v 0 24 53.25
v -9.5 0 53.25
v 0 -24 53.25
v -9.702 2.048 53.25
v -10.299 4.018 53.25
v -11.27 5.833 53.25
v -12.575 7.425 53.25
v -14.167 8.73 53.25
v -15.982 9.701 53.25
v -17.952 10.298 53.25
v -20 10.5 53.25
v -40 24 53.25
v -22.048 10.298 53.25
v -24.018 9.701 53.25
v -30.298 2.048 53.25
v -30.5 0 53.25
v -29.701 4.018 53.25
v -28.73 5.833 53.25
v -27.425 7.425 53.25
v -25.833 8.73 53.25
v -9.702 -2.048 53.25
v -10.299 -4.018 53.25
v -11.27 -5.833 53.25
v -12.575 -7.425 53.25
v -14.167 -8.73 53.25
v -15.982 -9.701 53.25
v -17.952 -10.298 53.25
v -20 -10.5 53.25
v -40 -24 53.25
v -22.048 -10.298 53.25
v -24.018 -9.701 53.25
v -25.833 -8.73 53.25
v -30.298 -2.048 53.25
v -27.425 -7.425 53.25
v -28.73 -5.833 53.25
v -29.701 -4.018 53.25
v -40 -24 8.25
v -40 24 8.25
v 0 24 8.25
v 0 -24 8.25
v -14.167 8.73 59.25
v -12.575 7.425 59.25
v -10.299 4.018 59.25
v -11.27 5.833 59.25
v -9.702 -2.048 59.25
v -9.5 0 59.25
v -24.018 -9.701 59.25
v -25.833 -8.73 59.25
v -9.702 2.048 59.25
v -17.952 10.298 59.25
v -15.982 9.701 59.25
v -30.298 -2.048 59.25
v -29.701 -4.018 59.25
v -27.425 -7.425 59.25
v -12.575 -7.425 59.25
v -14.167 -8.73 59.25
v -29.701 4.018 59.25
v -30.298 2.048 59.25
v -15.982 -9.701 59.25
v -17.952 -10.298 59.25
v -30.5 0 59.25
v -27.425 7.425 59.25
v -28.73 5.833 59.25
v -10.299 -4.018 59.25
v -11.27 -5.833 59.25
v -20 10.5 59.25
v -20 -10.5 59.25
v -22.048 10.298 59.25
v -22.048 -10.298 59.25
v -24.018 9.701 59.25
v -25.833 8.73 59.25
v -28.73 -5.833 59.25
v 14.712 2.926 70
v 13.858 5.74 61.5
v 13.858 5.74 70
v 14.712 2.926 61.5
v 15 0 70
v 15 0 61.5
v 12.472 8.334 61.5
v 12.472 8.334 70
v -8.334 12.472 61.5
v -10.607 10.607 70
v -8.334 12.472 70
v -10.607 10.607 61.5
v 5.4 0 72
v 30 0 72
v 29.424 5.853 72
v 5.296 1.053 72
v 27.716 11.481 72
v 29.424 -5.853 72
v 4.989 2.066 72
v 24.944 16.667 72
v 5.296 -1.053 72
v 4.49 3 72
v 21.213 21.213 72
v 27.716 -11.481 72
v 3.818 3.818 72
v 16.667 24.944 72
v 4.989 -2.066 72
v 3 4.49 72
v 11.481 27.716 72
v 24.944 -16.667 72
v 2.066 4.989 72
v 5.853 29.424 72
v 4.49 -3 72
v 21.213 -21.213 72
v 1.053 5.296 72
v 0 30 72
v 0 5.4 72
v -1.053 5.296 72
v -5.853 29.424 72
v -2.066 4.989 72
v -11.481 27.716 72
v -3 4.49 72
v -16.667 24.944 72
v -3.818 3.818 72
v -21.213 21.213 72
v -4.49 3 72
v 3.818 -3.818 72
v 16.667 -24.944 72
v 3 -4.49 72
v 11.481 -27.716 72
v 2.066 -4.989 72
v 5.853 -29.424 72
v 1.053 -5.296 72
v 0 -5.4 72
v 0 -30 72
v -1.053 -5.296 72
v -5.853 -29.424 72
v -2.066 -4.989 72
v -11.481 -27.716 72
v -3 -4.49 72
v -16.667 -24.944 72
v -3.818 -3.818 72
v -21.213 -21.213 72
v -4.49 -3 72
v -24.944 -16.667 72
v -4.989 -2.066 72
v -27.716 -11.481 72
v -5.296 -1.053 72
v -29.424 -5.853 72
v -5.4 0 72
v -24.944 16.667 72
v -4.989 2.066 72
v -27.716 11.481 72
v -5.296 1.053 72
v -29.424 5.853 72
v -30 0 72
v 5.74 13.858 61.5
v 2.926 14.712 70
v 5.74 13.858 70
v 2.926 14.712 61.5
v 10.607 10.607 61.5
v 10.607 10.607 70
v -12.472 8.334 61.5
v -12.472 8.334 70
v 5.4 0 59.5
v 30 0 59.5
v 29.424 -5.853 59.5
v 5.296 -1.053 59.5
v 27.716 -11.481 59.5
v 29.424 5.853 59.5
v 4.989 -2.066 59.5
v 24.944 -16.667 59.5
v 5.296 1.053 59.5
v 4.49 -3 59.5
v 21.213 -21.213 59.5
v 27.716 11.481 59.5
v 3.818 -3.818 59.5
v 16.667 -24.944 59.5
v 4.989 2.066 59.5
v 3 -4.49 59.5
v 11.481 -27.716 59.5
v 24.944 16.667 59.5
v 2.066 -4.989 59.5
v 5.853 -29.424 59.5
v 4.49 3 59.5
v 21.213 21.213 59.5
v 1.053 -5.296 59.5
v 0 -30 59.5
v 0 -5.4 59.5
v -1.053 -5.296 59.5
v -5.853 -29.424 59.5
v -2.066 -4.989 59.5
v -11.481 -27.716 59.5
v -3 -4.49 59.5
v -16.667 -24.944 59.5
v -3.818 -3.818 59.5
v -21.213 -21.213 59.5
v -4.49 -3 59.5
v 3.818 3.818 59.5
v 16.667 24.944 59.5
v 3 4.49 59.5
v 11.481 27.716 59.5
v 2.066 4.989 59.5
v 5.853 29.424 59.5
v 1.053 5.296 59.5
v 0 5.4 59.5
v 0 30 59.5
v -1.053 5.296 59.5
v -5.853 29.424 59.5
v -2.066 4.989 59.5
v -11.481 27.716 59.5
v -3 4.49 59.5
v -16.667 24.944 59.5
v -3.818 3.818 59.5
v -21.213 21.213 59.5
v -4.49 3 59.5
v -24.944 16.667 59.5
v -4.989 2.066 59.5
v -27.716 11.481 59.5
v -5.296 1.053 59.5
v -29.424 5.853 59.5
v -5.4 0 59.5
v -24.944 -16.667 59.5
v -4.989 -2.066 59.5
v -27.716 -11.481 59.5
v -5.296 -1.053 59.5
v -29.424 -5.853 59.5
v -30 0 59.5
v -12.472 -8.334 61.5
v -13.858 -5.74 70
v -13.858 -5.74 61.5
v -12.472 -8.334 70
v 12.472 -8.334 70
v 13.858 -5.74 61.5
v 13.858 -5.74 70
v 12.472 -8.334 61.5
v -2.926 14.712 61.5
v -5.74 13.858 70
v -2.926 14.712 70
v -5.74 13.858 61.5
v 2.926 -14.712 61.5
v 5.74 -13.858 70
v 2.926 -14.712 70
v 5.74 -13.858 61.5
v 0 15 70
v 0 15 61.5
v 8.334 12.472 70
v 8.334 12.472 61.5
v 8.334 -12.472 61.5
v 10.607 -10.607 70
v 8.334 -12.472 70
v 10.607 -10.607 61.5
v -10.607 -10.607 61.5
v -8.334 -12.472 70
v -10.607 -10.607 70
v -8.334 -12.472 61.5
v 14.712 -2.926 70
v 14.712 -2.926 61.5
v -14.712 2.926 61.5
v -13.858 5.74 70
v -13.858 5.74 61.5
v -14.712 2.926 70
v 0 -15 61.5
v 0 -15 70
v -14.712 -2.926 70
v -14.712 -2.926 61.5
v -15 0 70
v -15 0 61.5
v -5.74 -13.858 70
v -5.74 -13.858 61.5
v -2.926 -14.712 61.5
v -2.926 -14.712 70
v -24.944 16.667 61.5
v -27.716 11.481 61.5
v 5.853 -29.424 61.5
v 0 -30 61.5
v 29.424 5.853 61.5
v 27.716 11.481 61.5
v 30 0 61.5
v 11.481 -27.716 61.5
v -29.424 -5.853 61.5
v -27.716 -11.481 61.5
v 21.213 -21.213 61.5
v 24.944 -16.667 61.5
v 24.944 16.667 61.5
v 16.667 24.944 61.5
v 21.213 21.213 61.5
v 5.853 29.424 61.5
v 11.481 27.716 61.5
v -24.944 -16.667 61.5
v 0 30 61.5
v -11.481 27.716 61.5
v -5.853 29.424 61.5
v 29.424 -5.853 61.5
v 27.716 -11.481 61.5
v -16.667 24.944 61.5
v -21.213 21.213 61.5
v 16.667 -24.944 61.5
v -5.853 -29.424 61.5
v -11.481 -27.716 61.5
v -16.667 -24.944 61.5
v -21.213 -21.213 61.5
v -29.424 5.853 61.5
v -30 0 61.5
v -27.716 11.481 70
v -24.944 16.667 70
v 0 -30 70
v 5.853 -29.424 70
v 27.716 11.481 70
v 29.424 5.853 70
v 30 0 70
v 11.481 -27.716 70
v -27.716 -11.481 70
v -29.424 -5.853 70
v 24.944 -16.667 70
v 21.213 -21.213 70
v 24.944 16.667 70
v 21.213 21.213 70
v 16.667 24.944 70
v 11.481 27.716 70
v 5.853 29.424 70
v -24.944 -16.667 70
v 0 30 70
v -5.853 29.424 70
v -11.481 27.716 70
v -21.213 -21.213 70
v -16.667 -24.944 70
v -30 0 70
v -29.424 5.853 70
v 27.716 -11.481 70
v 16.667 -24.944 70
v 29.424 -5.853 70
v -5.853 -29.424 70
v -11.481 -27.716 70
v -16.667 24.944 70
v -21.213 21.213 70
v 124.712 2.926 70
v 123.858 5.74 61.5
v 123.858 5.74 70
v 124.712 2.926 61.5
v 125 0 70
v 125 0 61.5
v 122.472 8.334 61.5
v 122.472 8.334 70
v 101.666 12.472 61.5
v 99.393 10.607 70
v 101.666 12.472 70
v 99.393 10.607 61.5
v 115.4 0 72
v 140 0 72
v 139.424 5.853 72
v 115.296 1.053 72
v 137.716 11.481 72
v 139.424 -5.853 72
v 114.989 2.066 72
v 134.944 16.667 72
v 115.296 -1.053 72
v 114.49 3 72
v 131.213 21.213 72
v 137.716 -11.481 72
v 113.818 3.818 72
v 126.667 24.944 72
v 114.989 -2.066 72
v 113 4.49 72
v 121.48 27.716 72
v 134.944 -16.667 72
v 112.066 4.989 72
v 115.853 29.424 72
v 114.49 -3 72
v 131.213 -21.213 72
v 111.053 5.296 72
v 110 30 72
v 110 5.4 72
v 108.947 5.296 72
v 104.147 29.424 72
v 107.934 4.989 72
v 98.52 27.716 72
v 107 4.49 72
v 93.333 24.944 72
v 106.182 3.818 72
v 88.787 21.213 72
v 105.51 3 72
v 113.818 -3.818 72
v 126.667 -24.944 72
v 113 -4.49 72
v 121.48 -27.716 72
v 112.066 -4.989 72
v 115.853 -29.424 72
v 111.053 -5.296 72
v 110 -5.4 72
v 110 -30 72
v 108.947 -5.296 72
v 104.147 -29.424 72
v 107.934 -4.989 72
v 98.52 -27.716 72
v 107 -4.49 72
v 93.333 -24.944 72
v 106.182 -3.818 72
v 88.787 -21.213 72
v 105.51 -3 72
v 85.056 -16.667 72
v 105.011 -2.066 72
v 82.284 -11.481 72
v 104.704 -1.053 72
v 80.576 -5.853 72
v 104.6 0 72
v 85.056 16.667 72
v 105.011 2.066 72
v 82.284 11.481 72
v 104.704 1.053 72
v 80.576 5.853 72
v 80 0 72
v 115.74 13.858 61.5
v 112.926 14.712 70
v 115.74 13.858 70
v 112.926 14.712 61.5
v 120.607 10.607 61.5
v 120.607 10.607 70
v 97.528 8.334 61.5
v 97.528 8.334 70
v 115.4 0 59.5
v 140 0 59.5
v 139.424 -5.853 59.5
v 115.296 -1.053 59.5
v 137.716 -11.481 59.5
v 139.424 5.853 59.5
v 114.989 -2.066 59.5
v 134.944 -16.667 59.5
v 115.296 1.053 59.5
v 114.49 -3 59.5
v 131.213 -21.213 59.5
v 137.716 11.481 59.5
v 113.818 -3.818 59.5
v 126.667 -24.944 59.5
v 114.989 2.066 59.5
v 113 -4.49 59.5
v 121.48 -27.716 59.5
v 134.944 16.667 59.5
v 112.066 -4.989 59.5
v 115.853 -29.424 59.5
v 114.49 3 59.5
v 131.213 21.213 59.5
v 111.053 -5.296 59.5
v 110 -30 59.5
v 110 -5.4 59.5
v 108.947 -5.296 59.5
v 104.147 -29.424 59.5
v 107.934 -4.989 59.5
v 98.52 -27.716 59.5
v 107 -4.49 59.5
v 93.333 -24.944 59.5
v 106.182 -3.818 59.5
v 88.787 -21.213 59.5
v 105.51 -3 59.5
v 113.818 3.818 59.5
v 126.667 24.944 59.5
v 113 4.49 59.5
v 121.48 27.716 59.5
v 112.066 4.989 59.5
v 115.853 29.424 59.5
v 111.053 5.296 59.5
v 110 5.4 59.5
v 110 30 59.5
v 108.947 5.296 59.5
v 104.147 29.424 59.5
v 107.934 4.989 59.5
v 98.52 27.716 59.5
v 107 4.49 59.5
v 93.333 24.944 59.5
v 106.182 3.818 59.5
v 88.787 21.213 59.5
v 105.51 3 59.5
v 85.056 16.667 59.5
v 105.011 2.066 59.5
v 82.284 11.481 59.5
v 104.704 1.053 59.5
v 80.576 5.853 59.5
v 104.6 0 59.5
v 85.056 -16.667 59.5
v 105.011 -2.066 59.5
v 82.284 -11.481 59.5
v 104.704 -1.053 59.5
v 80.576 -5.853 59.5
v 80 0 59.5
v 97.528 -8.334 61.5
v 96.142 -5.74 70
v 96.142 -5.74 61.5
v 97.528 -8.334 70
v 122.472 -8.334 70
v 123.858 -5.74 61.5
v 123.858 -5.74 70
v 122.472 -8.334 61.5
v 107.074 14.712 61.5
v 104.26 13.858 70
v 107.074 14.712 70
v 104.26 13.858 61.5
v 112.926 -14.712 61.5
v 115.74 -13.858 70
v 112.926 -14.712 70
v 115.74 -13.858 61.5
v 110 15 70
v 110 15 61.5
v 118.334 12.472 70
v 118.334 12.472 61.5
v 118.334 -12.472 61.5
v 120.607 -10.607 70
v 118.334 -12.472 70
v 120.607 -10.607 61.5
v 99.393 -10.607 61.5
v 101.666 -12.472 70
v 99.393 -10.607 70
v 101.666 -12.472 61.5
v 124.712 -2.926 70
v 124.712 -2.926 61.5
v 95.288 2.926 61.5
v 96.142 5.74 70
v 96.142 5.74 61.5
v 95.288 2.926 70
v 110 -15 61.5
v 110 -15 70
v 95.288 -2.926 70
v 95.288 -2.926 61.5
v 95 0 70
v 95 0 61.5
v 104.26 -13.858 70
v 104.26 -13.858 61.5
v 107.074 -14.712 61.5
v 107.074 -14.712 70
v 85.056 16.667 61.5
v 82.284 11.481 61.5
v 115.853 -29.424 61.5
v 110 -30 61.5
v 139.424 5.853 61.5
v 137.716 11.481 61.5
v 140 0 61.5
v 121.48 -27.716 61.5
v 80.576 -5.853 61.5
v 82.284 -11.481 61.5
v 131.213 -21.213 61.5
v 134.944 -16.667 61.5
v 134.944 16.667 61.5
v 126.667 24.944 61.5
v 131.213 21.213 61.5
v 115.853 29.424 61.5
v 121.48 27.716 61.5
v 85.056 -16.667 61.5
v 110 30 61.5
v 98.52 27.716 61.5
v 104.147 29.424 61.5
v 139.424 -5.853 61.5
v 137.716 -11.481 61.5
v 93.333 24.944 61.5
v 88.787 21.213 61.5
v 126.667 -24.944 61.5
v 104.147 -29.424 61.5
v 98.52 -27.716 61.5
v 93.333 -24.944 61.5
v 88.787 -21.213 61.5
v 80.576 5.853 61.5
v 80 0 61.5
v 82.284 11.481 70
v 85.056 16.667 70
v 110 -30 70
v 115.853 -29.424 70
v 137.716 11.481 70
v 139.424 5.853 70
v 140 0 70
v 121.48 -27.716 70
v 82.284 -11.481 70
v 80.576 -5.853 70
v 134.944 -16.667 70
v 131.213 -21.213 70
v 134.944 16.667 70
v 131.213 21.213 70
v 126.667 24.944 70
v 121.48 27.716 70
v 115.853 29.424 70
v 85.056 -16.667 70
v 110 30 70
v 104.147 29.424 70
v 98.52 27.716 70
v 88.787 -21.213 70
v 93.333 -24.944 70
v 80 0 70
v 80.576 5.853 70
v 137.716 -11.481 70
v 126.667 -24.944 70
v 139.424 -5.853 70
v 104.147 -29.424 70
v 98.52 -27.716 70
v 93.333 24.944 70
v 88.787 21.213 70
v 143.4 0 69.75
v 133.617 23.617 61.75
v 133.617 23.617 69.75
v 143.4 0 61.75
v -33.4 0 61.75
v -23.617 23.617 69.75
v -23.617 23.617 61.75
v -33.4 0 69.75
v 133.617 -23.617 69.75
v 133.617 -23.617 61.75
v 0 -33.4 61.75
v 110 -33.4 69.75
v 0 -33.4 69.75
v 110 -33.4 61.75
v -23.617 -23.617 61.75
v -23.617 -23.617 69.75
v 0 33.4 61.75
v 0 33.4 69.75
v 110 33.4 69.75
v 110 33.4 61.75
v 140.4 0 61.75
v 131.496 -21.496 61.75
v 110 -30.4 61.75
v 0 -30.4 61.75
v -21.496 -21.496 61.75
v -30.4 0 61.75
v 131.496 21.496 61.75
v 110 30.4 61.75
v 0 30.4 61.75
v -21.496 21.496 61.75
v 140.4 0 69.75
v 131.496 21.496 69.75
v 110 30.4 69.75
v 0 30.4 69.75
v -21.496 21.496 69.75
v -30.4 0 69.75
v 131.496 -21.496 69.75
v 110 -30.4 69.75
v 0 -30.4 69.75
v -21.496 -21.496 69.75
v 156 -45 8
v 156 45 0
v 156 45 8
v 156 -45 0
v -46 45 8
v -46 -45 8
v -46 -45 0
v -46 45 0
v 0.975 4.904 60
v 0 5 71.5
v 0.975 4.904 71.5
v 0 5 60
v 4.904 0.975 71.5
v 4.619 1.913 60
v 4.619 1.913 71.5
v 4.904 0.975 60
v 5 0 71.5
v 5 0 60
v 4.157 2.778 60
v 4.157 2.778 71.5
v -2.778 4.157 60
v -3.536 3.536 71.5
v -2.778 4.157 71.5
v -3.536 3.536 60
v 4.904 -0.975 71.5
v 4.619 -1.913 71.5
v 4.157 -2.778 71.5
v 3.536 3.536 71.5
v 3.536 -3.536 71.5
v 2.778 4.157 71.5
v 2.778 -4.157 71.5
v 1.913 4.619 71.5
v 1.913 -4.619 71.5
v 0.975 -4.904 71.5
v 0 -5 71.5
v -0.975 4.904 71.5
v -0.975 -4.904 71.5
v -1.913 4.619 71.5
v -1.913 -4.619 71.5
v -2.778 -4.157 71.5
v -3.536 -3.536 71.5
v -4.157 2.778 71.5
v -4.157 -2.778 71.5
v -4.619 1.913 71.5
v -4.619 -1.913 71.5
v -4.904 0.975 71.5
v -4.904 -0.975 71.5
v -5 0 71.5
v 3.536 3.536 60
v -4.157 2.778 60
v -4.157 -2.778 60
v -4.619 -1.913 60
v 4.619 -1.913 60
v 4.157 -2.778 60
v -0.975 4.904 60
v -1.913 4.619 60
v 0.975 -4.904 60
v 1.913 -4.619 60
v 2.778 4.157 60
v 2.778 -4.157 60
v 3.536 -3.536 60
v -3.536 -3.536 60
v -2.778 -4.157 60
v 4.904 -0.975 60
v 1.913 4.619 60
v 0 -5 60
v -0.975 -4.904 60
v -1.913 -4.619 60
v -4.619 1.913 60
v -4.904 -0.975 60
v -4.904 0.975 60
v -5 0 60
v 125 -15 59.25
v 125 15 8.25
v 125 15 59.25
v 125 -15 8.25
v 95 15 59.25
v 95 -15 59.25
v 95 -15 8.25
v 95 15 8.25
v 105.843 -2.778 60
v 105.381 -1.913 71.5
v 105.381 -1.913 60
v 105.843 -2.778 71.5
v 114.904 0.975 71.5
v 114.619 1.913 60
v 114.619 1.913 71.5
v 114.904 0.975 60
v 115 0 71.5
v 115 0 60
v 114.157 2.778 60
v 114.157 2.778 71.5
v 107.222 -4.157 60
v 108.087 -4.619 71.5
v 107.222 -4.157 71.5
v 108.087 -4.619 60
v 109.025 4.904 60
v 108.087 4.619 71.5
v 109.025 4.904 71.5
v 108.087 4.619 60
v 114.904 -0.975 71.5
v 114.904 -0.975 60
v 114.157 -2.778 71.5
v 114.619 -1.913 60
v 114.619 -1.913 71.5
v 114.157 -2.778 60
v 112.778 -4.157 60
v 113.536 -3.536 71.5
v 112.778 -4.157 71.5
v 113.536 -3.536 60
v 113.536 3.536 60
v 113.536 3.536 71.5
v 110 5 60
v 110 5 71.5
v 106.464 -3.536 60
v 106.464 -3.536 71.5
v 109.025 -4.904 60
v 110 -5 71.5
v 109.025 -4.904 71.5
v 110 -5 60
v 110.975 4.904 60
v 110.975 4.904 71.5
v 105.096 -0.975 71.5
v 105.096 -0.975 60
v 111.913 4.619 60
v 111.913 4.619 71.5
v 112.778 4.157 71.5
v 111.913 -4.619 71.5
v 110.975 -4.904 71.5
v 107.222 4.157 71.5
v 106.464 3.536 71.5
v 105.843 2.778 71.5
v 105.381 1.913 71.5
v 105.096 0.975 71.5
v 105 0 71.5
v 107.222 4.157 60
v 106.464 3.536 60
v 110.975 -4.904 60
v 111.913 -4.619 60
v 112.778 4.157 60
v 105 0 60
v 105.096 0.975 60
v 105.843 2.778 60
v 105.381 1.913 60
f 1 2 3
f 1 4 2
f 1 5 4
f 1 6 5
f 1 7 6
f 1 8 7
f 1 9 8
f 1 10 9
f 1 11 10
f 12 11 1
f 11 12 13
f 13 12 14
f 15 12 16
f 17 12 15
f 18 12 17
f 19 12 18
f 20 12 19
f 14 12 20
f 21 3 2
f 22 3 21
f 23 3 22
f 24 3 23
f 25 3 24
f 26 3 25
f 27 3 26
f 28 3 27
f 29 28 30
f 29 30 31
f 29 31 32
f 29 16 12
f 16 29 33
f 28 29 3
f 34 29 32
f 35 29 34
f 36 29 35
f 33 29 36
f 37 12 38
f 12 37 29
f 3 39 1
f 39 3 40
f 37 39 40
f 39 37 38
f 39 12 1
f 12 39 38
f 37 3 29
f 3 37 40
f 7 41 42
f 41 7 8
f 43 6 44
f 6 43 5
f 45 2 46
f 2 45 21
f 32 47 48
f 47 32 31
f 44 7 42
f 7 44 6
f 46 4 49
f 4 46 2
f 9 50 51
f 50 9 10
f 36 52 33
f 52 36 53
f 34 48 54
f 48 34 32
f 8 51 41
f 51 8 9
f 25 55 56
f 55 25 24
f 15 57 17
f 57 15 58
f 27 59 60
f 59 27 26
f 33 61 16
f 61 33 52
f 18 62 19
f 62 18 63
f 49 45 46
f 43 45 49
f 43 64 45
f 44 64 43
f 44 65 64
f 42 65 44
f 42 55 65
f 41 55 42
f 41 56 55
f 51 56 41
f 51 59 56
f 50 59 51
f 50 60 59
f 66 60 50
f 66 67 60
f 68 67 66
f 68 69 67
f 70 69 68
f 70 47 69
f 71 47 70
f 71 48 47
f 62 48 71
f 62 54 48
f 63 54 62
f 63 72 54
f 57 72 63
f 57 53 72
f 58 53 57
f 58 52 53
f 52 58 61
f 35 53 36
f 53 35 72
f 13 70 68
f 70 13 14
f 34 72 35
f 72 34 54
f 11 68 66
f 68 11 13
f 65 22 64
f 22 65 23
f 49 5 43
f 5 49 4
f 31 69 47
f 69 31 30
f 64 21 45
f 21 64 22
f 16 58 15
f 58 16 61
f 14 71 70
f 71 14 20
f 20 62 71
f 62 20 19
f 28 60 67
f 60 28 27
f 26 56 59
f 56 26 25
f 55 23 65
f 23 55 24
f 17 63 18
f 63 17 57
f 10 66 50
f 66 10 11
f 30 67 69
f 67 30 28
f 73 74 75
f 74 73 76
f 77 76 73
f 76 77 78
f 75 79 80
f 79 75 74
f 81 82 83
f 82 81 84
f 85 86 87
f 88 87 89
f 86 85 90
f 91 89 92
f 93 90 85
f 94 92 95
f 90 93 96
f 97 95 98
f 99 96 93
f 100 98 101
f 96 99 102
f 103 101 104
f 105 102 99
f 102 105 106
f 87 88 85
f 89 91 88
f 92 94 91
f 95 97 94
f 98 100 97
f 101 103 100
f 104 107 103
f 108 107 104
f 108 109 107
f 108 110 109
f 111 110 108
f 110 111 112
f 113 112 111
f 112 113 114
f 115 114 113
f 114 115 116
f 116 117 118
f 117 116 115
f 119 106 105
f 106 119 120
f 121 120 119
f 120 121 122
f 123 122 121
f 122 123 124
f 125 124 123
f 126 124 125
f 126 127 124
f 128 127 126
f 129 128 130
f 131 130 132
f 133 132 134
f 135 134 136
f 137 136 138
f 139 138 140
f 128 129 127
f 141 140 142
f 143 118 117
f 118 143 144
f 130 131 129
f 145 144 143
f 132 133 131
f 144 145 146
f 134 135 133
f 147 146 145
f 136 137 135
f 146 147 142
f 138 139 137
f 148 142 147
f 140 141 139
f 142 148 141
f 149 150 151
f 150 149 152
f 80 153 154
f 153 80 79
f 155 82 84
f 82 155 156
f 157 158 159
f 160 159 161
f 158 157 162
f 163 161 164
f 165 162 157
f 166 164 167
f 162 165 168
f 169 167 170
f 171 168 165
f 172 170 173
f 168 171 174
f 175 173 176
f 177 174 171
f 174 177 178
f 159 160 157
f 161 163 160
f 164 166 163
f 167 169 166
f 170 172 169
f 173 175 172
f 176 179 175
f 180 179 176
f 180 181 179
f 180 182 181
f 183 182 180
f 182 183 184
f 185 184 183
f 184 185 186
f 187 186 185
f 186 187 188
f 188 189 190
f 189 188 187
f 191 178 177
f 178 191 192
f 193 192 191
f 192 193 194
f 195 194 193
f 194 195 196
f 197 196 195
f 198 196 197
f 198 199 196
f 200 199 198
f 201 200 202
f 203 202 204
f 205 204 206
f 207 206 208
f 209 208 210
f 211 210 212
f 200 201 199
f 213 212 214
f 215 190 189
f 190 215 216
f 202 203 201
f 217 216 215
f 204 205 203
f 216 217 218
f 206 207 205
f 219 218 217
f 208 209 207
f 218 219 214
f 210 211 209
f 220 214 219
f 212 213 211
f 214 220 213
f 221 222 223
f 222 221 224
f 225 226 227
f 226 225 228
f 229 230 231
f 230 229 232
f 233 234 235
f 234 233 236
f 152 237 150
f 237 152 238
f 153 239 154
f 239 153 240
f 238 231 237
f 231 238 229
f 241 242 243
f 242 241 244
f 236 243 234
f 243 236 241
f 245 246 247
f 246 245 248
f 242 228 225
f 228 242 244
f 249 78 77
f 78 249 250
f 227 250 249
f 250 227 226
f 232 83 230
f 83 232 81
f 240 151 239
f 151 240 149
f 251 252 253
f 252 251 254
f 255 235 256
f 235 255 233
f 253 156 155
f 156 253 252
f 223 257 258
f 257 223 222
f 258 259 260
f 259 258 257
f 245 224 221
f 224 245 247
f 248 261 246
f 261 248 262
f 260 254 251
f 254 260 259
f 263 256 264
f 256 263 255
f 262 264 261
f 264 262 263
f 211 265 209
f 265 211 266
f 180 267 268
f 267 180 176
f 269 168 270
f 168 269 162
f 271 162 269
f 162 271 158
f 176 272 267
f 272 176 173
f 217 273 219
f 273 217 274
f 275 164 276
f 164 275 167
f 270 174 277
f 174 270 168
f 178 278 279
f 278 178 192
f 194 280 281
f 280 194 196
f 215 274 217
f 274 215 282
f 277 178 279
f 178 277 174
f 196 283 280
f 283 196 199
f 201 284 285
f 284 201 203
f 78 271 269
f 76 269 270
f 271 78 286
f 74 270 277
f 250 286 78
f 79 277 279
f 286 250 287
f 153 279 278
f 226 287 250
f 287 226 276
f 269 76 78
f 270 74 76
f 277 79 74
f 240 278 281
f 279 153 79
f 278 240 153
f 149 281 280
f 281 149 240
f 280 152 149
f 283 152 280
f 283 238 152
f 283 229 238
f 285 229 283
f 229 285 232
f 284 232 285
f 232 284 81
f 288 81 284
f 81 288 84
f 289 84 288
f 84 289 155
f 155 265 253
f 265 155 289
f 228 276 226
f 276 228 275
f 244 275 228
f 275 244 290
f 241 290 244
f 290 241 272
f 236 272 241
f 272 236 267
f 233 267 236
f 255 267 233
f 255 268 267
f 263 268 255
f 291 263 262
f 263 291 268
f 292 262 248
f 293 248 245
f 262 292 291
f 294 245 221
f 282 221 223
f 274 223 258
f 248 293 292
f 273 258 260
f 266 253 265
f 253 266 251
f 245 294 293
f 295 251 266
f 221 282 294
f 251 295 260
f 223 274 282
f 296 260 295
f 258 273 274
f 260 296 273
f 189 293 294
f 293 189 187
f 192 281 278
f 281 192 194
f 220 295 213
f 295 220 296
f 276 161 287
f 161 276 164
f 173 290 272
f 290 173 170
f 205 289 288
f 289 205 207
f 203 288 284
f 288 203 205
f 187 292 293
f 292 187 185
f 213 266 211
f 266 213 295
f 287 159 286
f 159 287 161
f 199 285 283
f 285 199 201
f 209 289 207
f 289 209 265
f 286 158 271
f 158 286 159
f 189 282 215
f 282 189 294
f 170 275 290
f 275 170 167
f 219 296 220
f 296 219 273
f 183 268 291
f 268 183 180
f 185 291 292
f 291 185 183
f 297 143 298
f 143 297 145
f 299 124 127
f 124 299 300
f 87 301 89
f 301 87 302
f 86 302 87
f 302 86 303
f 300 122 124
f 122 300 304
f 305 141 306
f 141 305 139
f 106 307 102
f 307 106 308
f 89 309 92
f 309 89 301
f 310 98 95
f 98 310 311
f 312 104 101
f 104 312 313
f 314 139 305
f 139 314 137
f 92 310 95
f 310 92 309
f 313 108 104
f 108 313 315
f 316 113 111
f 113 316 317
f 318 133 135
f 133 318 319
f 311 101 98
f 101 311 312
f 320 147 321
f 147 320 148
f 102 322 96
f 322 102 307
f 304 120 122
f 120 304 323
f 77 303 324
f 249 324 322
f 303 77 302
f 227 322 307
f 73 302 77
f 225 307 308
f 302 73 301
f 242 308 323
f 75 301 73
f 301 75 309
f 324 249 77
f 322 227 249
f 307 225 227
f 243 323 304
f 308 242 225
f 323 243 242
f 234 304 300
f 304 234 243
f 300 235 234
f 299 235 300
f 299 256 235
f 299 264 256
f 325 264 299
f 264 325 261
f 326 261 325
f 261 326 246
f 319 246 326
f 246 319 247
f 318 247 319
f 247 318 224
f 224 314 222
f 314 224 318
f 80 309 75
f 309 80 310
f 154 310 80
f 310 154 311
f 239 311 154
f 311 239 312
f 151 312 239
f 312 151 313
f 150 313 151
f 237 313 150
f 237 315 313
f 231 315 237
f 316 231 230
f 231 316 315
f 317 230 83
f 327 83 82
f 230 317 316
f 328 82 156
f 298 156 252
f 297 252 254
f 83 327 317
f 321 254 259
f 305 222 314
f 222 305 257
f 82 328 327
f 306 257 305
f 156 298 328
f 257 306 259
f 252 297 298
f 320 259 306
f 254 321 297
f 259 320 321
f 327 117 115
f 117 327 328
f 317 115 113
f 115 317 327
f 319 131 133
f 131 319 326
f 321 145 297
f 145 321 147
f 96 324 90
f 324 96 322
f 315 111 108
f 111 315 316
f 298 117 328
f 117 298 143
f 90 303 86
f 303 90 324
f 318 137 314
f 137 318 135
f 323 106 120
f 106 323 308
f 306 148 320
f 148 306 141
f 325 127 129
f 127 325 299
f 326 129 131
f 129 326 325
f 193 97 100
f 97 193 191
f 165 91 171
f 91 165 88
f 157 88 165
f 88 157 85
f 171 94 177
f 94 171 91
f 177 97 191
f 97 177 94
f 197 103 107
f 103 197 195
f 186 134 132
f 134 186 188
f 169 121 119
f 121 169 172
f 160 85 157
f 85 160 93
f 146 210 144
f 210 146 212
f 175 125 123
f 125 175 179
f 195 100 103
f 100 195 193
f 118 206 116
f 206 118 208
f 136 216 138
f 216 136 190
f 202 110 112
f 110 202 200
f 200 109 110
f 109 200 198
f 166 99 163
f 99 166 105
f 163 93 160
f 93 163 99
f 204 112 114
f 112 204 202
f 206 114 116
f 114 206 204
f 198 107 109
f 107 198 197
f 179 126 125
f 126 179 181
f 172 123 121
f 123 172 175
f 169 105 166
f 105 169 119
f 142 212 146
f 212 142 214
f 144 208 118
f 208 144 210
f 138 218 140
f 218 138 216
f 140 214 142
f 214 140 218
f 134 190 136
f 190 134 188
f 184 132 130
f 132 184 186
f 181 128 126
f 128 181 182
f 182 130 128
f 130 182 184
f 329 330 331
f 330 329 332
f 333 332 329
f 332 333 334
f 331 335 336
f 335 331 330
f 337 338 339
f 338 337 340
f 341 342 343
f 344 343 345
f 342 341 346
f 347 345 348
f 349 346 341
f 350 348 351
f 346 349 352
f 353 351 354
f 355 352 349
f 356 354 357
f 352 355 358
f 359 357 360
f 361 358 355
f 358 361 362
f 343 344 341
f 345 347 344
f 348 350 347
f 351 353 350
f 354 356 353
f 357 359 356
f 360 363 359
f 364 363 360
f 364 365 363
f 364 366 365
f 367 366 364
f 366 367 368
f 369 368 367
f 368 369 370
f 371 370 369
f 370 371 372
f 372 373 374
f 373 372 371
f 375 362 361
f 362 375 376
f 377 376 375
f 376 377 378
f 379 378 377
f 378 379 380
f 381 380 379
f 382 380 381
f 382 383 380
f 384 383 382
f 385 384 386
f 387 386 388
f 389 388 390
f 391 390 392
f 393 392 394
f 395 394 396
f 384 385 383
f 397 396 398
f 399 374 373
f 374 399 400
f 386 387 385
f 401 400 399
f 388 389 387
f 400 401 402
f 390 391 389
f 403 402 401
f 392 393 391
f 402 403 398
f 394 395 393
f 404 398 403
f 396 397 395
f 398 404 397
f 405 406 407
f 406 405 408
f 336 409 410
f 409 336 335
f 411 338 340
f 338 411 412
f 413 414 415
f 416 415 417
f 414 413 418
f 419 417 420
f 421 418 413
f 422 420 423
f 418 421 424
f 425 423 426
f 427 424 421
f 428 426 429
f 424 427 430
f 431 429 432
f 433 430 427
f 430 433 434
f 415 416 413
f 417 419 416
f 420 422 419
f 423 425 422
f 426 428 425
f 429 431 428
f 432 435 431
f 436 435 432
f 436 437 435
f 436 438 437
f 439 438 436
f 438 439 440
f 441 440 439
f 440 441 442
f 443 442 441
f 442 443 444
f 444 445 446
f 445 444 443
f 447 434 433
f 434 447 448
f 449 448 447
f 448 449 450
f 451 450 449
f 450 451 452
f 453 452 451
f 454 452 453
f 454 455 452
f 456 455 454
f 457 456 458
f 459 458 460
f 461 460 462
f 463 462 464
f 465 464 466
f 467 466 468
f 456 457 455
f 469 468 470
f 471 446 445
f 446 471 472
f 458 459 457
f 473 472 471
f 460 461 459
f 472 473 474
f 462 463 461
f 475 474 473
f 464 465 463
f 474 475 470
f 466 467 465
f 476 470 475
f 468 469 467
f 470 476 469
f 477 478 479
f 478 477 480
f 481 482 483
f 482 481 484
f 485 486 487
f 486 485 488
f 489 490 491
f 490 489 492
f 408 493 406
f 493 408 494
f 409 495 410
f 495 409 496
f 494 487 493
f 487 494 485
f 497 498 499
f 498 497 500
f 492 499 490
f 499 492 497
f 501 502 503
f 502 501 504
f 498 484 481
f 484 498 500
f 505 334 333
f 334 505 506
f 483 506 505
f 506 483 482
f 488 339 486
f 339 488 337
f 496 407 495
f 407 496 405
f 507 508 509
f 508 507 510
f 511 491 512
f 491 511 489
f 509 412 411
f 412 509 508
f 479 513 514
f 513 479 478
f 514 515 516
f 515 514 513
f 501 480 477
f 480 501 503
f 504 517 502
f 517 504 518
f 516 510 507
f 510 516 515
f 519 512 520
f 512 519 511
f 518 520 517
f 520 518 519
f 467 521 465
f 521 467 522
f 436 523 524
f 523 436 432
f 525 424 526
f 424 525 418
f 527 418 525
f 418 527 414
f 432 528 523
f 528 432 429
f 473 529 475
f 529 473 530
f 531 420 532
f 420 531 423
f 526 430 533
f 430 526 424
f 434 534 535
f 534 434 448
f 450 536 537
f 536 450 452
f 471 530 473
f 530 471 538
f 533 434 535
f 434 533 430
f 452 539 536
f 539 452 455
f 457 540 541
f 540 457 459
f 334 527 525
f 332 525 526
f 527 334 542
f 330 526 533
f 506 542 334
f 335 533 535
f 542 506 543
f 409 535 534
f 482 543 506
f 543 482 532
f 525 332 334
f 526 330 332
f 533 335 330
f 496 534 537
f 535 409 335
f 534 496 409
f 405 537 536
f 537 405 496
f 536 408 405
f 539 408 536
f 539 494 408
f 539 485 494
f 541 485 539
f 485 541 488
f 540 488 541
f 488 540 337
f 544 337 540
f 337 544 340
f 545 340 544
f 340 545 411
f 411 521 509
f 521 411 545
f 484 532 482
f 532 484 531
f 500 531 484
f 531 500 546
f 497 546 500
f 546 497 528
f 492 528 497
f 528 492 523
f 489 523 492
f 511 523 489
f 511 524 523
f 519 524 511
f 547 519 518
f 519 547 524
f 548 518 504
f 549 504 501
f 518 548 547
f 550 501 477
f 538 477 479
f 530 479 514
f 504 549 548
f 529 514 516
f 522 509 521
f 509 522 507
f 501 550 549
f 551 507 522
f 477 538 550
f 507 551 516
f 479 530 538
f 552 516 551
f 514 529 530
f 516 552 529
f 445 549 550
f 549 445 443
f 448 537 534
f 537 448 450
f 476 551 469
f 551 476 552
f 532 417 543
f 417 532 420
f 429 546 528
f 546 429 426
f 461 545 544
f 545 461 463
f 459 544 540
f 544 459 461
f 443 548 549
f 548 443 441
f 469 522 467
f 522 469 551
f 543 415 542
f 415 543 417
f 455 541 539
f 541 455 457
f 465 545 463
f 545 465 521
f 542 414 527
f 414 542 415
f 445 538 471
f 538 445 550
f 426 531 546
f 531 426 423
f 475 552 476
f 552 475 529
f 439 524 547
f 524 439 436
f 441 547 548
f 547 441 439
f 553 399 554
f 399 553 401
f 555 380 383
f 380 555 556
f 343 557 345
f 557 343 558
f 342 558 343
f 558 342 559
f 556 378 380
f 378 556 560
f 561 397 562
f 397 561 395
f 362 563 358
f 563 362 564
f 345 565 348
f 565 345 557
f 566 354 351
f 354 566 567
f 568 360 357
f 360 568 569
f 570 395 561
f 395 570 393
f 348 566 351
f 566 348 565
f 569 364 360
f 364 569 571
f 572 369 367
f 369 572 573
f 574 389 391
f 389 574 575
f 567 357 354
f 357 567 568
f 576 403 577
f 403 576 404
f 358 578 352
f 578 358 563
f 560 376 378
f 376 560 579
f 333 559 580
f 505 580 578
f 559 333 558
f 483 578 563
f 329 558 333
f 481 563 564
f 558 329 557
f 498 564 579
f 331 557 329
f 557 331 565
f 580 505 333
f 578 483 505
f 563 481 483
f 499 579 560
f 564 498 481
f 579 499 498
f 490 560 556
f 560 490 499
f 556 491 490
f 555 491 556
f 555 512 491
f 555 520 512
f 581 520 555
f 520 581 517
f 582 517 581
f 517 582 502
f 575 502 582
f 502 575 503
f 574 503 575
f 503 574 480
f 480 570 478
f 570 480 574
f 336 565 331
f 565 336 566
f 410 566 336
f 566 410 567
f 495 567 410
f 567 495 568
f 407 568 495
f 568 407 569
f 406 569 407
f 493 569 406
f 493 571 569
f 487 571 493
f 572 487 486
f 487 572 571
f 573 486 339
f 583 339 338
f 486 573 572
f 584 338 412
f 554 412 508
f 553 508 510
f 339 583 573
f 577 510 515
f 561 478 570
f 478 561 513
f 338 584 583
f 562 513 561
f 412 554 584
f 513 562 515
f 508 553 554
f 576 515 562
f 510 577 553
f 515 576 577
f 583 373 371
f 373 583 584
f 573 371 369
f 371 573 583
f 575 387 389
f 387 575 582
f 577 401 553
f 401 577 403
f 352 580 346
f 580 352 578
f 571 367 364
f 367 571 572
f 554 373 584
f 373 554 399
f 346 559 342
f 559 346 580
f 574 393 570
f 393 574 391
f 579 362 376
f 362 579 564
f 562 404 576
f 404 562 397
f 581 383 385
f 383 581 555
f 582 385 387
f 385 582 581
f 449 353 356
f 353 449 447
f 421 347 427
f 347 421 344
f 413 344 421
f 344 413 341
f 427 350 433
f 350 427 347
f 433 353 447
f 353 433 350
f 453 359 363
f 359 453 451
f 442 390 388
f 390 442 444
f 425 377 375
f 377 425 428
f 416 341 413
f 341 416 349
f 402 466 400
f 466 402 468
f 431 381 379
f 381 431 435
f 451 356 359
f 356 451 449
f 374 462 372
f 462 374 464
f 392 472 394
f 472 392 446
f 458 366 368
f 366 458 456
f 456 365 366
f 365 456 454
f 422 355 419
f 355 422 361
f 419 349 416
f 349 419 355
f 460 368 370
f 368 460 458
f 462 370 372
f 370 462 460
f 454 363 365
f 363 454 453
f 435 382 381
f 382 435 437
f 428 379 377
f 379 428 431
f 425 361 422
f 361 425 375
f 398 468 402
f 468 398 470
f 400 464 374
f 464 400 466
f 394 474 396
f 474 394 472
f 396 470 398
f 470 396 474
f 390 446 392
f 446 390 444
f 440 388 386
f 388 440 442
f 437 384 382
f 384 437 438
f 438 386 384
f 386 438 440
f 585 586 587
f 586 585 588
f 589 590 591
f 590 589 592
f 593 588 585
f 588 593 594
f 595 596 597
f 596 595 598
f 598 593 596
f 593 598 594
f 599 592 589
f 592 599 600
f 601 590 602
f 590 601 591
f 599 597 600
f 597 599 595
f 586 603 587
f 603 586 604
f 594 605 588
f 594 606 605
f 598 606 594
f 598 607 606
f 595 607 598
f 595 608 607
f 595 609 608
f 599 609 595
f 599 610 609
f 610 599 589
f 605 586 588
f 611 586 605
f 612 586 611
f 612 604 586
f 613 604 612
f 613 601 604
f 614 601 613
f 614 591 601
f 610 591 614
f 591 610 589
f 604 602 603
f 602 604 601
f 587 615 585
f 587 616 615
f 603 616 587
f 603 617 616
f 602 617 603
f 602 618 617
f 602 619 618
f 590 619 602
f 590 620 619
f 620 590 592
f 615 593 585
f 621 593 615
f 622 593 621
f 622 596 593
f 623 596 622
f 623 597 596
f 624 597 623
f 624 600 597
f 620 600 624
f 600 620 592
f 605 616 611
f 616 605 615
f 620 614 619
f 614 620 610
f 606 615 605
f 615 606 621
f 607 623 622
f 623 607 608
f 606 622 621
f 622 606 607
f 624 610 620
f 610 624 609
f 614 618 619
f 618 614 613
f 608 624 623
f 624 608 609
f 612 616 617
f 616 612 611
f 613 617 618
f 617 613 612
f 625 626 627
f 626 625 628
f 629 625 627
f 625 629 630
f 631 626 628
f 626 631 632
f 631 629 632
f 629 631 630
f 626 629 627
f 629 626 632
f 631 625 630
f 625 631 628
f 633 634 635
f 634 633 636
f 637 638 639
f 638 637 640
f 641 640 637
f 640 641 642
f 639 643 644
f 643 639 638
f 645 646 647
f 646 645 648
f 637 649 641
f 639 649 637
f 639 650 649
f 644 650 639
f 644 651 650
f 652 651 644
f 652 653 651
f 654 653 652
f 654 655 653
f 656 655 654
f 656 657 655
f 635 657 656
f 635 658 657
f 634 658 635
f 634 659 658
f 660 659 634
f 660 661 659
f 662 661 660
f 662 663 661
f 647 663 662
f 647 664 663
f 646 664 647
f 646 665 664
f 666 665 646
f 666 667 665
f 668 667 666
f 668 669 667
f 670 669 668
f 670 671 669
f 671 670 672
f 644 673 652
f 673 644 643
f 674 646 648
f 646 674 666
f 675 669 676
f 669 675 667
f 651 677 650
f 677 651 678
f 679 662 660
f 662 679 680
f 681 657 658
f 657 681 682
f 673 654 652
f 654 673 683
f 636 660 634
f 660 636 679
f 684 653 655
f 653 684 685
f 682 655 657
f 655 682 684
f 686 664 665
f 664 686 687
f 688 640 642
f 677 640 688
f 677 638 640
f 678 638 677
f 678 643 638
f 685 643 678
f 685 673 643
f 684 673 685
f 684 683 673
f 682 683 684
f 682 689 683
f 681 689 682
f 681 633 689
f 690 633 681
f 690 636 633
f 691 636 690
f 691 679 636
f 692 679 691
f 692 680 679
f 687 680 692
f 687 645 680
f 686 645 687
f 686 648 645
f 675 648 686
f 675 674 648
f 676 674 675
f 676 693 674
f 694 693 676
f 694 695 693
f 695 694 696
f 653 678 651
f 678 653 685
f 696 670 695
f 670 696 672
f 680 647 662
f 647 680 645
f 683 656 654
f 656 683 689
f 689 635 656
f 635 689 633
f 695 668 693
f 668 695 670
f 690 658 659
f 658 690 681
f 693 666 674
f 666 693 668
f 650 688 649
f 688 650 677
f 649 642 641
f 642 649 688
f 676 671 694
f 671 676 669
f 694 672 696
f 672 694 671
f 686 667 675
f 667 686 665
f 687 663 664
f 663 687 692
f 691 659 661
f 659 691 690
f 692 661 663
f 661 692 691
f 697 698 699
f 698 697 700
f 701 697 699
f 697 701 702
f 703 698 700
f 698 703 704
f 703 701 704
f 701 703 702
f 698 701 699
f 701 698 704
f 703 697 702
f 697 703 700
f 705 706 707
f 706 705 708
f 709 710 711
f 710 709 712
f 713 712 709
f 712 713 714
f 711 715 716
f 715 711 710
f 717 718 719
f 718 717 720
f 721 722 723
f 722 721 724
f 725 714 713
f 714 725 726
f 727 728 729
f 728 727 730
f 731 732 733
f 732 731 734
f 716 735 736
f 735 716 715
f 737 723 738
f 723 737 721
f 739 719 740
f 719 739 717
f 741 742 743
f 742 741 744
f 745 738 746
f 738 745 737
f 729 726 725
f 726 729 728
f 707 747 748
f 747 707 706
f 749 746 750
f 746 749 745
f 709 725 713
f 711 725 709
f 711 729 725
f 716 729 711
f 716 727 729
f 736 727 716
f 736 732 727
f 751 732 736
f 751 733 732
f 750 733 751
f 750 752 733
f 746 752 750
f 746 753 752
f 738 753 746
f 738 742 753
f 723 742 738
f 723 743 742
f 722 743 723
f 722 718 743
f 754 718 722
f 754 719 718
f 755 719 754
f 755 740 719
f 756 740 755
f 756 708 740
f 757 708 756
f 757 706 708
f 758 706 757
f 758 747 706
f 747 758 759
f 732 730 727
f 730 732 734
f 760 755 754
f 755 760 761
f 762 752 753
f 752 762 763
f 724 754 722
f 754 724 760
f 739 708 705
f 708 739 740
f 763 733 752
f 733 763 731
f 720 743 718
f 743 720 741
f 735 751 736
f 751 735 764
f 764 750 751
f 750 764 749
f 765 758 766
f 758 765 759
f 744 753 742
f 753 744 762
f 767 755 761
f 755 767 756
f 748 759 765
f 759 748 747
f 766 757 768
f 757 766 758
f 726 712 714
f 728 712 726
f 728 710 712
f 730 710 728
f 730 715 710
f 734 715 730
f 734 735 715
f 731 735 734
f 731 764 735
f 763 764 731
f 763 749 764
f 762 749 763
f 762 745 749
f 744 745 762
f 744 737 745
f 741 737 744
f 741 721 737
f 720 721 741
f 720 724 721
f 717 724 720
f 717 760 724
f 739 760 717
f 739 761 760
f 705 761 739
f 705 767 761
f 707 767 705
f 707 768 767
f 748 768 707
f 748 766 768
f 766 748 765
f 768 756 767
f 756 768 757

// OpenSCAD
$fn = 32;

// ------------------------------------------------------------------------
// Motor belt drive: span 110 mm, pulleys d60, belt 8 mm wide
// Every part is its own module, assembly() places every instance.
// ------------------------------------------------------------------------

// --- part 1 ---
module base_plate() {
  difference() {
    translate([-101, -45, 0]) cube([202, 90, 8]);
  }
}

// --- part 2 ---
module motor() {
  union() {
    translate([-22.5, -24, 0]) cube([45, 48, 40]);
    translate([25.5, 0, 20]) rotate([0, 90, 0]) cylinder(h = 6, d = 21, center = true);
  }
}

// --- part 3 ---
module drive_shaft() {
  translate([0, 0, -5.75]) cylinder(h = 11.5, d = 10);
}

// --- part 4 ---
module pulley_drive() {
  difference() {
    union() {
      cylinder(h = 12.5, d = 30);
      cylinder(h = 2, d = 60);
      translate([0, 0, 10.5]) cylinder(h = 2, d = 60);
    }
    translate([0, 0, -1]) cylinder(h = 14.5, d = 10.8);
  }
}

// --- part 5 ---
module idler_post() {
  translate([-15, -15, 0]) cube([30, 30, 51]);
}

// --- part 6 ---
module driven_shaft() {
  translate([0, 0, -5.75]) cylinder(h = 11.5, d = 10);
}

// --- part 7 ---
module pulley_driven() {
  difference() {
    union() {
      cylinder(h = 12.5, d = 30);
      cylinder(h = 2, d = 60);
      translate([0, 0, 10.5]) cylinder(h = 2, d = 60);
    }
    translate([0, 0, -1]) cylinder(h = 14.5, d = 10.8);
  }
}

// --- part 8 ---
module drive_belt() {
  difference() {
    linear_extrude(height = 8) polygon(points = concat([for (a = [90 : 45 : 270]) [33.4 * cos(a), 33.4 * sin(a)]], [for (a = [270 : 45 : 450]) [110 + 33.4 * cos(a), 33.4 * sin(a)]]));
    translate([0, 0, -1]) linear_extrude(height = 10) polygon(points = concat([for (a = [90 : 45 : 270]) [30.4 * cos(a), 30.4 * sin(a)]], [for (a = [270 : 45 : 450]) [110 + 30.4 * cos(a), 30.4 * sin(a)]]));
  }
}

// --- assembly ---
module assembly() {
  color([0.80, 0.24, 0.20]) translate([55, 0, 0]) rotate([0, 0, 0]) base_plate();
  color([0.20, 0.45, 0.75]) translate([0, 0, 30.75]) rotate([0, 270, 0]) motor();
  color([0.25, 0.62, 0.32]) translate([0, 0, 65.75]) rotate([0, 0, 0]) drive_shaft();
  color([0.92, 0.70, 0.18]) translate([0, 0, 59.5]) rotate([0, 0, 0]) pulley_drive();
  color([0.58, 0.35, 0.70]) translate([110, 0, 8.25]) rotate([0, 0, 0]) idler_post();
  color([0.16, 0.66, 0.66]) translate([110, 0, 65.75]) rotate([0, 0, 0]) driven_shaft();
  color([0.85, 0.48, 0.18]) translate([110, 0, 59.5]) rotate([0, 0, 0]) pulley_driven();
  color([0.55, 0.60, 0.65]) translate([0, 0, 61.75]) rotate([0, 0, 0]) drive_belt();
}

assembly();
